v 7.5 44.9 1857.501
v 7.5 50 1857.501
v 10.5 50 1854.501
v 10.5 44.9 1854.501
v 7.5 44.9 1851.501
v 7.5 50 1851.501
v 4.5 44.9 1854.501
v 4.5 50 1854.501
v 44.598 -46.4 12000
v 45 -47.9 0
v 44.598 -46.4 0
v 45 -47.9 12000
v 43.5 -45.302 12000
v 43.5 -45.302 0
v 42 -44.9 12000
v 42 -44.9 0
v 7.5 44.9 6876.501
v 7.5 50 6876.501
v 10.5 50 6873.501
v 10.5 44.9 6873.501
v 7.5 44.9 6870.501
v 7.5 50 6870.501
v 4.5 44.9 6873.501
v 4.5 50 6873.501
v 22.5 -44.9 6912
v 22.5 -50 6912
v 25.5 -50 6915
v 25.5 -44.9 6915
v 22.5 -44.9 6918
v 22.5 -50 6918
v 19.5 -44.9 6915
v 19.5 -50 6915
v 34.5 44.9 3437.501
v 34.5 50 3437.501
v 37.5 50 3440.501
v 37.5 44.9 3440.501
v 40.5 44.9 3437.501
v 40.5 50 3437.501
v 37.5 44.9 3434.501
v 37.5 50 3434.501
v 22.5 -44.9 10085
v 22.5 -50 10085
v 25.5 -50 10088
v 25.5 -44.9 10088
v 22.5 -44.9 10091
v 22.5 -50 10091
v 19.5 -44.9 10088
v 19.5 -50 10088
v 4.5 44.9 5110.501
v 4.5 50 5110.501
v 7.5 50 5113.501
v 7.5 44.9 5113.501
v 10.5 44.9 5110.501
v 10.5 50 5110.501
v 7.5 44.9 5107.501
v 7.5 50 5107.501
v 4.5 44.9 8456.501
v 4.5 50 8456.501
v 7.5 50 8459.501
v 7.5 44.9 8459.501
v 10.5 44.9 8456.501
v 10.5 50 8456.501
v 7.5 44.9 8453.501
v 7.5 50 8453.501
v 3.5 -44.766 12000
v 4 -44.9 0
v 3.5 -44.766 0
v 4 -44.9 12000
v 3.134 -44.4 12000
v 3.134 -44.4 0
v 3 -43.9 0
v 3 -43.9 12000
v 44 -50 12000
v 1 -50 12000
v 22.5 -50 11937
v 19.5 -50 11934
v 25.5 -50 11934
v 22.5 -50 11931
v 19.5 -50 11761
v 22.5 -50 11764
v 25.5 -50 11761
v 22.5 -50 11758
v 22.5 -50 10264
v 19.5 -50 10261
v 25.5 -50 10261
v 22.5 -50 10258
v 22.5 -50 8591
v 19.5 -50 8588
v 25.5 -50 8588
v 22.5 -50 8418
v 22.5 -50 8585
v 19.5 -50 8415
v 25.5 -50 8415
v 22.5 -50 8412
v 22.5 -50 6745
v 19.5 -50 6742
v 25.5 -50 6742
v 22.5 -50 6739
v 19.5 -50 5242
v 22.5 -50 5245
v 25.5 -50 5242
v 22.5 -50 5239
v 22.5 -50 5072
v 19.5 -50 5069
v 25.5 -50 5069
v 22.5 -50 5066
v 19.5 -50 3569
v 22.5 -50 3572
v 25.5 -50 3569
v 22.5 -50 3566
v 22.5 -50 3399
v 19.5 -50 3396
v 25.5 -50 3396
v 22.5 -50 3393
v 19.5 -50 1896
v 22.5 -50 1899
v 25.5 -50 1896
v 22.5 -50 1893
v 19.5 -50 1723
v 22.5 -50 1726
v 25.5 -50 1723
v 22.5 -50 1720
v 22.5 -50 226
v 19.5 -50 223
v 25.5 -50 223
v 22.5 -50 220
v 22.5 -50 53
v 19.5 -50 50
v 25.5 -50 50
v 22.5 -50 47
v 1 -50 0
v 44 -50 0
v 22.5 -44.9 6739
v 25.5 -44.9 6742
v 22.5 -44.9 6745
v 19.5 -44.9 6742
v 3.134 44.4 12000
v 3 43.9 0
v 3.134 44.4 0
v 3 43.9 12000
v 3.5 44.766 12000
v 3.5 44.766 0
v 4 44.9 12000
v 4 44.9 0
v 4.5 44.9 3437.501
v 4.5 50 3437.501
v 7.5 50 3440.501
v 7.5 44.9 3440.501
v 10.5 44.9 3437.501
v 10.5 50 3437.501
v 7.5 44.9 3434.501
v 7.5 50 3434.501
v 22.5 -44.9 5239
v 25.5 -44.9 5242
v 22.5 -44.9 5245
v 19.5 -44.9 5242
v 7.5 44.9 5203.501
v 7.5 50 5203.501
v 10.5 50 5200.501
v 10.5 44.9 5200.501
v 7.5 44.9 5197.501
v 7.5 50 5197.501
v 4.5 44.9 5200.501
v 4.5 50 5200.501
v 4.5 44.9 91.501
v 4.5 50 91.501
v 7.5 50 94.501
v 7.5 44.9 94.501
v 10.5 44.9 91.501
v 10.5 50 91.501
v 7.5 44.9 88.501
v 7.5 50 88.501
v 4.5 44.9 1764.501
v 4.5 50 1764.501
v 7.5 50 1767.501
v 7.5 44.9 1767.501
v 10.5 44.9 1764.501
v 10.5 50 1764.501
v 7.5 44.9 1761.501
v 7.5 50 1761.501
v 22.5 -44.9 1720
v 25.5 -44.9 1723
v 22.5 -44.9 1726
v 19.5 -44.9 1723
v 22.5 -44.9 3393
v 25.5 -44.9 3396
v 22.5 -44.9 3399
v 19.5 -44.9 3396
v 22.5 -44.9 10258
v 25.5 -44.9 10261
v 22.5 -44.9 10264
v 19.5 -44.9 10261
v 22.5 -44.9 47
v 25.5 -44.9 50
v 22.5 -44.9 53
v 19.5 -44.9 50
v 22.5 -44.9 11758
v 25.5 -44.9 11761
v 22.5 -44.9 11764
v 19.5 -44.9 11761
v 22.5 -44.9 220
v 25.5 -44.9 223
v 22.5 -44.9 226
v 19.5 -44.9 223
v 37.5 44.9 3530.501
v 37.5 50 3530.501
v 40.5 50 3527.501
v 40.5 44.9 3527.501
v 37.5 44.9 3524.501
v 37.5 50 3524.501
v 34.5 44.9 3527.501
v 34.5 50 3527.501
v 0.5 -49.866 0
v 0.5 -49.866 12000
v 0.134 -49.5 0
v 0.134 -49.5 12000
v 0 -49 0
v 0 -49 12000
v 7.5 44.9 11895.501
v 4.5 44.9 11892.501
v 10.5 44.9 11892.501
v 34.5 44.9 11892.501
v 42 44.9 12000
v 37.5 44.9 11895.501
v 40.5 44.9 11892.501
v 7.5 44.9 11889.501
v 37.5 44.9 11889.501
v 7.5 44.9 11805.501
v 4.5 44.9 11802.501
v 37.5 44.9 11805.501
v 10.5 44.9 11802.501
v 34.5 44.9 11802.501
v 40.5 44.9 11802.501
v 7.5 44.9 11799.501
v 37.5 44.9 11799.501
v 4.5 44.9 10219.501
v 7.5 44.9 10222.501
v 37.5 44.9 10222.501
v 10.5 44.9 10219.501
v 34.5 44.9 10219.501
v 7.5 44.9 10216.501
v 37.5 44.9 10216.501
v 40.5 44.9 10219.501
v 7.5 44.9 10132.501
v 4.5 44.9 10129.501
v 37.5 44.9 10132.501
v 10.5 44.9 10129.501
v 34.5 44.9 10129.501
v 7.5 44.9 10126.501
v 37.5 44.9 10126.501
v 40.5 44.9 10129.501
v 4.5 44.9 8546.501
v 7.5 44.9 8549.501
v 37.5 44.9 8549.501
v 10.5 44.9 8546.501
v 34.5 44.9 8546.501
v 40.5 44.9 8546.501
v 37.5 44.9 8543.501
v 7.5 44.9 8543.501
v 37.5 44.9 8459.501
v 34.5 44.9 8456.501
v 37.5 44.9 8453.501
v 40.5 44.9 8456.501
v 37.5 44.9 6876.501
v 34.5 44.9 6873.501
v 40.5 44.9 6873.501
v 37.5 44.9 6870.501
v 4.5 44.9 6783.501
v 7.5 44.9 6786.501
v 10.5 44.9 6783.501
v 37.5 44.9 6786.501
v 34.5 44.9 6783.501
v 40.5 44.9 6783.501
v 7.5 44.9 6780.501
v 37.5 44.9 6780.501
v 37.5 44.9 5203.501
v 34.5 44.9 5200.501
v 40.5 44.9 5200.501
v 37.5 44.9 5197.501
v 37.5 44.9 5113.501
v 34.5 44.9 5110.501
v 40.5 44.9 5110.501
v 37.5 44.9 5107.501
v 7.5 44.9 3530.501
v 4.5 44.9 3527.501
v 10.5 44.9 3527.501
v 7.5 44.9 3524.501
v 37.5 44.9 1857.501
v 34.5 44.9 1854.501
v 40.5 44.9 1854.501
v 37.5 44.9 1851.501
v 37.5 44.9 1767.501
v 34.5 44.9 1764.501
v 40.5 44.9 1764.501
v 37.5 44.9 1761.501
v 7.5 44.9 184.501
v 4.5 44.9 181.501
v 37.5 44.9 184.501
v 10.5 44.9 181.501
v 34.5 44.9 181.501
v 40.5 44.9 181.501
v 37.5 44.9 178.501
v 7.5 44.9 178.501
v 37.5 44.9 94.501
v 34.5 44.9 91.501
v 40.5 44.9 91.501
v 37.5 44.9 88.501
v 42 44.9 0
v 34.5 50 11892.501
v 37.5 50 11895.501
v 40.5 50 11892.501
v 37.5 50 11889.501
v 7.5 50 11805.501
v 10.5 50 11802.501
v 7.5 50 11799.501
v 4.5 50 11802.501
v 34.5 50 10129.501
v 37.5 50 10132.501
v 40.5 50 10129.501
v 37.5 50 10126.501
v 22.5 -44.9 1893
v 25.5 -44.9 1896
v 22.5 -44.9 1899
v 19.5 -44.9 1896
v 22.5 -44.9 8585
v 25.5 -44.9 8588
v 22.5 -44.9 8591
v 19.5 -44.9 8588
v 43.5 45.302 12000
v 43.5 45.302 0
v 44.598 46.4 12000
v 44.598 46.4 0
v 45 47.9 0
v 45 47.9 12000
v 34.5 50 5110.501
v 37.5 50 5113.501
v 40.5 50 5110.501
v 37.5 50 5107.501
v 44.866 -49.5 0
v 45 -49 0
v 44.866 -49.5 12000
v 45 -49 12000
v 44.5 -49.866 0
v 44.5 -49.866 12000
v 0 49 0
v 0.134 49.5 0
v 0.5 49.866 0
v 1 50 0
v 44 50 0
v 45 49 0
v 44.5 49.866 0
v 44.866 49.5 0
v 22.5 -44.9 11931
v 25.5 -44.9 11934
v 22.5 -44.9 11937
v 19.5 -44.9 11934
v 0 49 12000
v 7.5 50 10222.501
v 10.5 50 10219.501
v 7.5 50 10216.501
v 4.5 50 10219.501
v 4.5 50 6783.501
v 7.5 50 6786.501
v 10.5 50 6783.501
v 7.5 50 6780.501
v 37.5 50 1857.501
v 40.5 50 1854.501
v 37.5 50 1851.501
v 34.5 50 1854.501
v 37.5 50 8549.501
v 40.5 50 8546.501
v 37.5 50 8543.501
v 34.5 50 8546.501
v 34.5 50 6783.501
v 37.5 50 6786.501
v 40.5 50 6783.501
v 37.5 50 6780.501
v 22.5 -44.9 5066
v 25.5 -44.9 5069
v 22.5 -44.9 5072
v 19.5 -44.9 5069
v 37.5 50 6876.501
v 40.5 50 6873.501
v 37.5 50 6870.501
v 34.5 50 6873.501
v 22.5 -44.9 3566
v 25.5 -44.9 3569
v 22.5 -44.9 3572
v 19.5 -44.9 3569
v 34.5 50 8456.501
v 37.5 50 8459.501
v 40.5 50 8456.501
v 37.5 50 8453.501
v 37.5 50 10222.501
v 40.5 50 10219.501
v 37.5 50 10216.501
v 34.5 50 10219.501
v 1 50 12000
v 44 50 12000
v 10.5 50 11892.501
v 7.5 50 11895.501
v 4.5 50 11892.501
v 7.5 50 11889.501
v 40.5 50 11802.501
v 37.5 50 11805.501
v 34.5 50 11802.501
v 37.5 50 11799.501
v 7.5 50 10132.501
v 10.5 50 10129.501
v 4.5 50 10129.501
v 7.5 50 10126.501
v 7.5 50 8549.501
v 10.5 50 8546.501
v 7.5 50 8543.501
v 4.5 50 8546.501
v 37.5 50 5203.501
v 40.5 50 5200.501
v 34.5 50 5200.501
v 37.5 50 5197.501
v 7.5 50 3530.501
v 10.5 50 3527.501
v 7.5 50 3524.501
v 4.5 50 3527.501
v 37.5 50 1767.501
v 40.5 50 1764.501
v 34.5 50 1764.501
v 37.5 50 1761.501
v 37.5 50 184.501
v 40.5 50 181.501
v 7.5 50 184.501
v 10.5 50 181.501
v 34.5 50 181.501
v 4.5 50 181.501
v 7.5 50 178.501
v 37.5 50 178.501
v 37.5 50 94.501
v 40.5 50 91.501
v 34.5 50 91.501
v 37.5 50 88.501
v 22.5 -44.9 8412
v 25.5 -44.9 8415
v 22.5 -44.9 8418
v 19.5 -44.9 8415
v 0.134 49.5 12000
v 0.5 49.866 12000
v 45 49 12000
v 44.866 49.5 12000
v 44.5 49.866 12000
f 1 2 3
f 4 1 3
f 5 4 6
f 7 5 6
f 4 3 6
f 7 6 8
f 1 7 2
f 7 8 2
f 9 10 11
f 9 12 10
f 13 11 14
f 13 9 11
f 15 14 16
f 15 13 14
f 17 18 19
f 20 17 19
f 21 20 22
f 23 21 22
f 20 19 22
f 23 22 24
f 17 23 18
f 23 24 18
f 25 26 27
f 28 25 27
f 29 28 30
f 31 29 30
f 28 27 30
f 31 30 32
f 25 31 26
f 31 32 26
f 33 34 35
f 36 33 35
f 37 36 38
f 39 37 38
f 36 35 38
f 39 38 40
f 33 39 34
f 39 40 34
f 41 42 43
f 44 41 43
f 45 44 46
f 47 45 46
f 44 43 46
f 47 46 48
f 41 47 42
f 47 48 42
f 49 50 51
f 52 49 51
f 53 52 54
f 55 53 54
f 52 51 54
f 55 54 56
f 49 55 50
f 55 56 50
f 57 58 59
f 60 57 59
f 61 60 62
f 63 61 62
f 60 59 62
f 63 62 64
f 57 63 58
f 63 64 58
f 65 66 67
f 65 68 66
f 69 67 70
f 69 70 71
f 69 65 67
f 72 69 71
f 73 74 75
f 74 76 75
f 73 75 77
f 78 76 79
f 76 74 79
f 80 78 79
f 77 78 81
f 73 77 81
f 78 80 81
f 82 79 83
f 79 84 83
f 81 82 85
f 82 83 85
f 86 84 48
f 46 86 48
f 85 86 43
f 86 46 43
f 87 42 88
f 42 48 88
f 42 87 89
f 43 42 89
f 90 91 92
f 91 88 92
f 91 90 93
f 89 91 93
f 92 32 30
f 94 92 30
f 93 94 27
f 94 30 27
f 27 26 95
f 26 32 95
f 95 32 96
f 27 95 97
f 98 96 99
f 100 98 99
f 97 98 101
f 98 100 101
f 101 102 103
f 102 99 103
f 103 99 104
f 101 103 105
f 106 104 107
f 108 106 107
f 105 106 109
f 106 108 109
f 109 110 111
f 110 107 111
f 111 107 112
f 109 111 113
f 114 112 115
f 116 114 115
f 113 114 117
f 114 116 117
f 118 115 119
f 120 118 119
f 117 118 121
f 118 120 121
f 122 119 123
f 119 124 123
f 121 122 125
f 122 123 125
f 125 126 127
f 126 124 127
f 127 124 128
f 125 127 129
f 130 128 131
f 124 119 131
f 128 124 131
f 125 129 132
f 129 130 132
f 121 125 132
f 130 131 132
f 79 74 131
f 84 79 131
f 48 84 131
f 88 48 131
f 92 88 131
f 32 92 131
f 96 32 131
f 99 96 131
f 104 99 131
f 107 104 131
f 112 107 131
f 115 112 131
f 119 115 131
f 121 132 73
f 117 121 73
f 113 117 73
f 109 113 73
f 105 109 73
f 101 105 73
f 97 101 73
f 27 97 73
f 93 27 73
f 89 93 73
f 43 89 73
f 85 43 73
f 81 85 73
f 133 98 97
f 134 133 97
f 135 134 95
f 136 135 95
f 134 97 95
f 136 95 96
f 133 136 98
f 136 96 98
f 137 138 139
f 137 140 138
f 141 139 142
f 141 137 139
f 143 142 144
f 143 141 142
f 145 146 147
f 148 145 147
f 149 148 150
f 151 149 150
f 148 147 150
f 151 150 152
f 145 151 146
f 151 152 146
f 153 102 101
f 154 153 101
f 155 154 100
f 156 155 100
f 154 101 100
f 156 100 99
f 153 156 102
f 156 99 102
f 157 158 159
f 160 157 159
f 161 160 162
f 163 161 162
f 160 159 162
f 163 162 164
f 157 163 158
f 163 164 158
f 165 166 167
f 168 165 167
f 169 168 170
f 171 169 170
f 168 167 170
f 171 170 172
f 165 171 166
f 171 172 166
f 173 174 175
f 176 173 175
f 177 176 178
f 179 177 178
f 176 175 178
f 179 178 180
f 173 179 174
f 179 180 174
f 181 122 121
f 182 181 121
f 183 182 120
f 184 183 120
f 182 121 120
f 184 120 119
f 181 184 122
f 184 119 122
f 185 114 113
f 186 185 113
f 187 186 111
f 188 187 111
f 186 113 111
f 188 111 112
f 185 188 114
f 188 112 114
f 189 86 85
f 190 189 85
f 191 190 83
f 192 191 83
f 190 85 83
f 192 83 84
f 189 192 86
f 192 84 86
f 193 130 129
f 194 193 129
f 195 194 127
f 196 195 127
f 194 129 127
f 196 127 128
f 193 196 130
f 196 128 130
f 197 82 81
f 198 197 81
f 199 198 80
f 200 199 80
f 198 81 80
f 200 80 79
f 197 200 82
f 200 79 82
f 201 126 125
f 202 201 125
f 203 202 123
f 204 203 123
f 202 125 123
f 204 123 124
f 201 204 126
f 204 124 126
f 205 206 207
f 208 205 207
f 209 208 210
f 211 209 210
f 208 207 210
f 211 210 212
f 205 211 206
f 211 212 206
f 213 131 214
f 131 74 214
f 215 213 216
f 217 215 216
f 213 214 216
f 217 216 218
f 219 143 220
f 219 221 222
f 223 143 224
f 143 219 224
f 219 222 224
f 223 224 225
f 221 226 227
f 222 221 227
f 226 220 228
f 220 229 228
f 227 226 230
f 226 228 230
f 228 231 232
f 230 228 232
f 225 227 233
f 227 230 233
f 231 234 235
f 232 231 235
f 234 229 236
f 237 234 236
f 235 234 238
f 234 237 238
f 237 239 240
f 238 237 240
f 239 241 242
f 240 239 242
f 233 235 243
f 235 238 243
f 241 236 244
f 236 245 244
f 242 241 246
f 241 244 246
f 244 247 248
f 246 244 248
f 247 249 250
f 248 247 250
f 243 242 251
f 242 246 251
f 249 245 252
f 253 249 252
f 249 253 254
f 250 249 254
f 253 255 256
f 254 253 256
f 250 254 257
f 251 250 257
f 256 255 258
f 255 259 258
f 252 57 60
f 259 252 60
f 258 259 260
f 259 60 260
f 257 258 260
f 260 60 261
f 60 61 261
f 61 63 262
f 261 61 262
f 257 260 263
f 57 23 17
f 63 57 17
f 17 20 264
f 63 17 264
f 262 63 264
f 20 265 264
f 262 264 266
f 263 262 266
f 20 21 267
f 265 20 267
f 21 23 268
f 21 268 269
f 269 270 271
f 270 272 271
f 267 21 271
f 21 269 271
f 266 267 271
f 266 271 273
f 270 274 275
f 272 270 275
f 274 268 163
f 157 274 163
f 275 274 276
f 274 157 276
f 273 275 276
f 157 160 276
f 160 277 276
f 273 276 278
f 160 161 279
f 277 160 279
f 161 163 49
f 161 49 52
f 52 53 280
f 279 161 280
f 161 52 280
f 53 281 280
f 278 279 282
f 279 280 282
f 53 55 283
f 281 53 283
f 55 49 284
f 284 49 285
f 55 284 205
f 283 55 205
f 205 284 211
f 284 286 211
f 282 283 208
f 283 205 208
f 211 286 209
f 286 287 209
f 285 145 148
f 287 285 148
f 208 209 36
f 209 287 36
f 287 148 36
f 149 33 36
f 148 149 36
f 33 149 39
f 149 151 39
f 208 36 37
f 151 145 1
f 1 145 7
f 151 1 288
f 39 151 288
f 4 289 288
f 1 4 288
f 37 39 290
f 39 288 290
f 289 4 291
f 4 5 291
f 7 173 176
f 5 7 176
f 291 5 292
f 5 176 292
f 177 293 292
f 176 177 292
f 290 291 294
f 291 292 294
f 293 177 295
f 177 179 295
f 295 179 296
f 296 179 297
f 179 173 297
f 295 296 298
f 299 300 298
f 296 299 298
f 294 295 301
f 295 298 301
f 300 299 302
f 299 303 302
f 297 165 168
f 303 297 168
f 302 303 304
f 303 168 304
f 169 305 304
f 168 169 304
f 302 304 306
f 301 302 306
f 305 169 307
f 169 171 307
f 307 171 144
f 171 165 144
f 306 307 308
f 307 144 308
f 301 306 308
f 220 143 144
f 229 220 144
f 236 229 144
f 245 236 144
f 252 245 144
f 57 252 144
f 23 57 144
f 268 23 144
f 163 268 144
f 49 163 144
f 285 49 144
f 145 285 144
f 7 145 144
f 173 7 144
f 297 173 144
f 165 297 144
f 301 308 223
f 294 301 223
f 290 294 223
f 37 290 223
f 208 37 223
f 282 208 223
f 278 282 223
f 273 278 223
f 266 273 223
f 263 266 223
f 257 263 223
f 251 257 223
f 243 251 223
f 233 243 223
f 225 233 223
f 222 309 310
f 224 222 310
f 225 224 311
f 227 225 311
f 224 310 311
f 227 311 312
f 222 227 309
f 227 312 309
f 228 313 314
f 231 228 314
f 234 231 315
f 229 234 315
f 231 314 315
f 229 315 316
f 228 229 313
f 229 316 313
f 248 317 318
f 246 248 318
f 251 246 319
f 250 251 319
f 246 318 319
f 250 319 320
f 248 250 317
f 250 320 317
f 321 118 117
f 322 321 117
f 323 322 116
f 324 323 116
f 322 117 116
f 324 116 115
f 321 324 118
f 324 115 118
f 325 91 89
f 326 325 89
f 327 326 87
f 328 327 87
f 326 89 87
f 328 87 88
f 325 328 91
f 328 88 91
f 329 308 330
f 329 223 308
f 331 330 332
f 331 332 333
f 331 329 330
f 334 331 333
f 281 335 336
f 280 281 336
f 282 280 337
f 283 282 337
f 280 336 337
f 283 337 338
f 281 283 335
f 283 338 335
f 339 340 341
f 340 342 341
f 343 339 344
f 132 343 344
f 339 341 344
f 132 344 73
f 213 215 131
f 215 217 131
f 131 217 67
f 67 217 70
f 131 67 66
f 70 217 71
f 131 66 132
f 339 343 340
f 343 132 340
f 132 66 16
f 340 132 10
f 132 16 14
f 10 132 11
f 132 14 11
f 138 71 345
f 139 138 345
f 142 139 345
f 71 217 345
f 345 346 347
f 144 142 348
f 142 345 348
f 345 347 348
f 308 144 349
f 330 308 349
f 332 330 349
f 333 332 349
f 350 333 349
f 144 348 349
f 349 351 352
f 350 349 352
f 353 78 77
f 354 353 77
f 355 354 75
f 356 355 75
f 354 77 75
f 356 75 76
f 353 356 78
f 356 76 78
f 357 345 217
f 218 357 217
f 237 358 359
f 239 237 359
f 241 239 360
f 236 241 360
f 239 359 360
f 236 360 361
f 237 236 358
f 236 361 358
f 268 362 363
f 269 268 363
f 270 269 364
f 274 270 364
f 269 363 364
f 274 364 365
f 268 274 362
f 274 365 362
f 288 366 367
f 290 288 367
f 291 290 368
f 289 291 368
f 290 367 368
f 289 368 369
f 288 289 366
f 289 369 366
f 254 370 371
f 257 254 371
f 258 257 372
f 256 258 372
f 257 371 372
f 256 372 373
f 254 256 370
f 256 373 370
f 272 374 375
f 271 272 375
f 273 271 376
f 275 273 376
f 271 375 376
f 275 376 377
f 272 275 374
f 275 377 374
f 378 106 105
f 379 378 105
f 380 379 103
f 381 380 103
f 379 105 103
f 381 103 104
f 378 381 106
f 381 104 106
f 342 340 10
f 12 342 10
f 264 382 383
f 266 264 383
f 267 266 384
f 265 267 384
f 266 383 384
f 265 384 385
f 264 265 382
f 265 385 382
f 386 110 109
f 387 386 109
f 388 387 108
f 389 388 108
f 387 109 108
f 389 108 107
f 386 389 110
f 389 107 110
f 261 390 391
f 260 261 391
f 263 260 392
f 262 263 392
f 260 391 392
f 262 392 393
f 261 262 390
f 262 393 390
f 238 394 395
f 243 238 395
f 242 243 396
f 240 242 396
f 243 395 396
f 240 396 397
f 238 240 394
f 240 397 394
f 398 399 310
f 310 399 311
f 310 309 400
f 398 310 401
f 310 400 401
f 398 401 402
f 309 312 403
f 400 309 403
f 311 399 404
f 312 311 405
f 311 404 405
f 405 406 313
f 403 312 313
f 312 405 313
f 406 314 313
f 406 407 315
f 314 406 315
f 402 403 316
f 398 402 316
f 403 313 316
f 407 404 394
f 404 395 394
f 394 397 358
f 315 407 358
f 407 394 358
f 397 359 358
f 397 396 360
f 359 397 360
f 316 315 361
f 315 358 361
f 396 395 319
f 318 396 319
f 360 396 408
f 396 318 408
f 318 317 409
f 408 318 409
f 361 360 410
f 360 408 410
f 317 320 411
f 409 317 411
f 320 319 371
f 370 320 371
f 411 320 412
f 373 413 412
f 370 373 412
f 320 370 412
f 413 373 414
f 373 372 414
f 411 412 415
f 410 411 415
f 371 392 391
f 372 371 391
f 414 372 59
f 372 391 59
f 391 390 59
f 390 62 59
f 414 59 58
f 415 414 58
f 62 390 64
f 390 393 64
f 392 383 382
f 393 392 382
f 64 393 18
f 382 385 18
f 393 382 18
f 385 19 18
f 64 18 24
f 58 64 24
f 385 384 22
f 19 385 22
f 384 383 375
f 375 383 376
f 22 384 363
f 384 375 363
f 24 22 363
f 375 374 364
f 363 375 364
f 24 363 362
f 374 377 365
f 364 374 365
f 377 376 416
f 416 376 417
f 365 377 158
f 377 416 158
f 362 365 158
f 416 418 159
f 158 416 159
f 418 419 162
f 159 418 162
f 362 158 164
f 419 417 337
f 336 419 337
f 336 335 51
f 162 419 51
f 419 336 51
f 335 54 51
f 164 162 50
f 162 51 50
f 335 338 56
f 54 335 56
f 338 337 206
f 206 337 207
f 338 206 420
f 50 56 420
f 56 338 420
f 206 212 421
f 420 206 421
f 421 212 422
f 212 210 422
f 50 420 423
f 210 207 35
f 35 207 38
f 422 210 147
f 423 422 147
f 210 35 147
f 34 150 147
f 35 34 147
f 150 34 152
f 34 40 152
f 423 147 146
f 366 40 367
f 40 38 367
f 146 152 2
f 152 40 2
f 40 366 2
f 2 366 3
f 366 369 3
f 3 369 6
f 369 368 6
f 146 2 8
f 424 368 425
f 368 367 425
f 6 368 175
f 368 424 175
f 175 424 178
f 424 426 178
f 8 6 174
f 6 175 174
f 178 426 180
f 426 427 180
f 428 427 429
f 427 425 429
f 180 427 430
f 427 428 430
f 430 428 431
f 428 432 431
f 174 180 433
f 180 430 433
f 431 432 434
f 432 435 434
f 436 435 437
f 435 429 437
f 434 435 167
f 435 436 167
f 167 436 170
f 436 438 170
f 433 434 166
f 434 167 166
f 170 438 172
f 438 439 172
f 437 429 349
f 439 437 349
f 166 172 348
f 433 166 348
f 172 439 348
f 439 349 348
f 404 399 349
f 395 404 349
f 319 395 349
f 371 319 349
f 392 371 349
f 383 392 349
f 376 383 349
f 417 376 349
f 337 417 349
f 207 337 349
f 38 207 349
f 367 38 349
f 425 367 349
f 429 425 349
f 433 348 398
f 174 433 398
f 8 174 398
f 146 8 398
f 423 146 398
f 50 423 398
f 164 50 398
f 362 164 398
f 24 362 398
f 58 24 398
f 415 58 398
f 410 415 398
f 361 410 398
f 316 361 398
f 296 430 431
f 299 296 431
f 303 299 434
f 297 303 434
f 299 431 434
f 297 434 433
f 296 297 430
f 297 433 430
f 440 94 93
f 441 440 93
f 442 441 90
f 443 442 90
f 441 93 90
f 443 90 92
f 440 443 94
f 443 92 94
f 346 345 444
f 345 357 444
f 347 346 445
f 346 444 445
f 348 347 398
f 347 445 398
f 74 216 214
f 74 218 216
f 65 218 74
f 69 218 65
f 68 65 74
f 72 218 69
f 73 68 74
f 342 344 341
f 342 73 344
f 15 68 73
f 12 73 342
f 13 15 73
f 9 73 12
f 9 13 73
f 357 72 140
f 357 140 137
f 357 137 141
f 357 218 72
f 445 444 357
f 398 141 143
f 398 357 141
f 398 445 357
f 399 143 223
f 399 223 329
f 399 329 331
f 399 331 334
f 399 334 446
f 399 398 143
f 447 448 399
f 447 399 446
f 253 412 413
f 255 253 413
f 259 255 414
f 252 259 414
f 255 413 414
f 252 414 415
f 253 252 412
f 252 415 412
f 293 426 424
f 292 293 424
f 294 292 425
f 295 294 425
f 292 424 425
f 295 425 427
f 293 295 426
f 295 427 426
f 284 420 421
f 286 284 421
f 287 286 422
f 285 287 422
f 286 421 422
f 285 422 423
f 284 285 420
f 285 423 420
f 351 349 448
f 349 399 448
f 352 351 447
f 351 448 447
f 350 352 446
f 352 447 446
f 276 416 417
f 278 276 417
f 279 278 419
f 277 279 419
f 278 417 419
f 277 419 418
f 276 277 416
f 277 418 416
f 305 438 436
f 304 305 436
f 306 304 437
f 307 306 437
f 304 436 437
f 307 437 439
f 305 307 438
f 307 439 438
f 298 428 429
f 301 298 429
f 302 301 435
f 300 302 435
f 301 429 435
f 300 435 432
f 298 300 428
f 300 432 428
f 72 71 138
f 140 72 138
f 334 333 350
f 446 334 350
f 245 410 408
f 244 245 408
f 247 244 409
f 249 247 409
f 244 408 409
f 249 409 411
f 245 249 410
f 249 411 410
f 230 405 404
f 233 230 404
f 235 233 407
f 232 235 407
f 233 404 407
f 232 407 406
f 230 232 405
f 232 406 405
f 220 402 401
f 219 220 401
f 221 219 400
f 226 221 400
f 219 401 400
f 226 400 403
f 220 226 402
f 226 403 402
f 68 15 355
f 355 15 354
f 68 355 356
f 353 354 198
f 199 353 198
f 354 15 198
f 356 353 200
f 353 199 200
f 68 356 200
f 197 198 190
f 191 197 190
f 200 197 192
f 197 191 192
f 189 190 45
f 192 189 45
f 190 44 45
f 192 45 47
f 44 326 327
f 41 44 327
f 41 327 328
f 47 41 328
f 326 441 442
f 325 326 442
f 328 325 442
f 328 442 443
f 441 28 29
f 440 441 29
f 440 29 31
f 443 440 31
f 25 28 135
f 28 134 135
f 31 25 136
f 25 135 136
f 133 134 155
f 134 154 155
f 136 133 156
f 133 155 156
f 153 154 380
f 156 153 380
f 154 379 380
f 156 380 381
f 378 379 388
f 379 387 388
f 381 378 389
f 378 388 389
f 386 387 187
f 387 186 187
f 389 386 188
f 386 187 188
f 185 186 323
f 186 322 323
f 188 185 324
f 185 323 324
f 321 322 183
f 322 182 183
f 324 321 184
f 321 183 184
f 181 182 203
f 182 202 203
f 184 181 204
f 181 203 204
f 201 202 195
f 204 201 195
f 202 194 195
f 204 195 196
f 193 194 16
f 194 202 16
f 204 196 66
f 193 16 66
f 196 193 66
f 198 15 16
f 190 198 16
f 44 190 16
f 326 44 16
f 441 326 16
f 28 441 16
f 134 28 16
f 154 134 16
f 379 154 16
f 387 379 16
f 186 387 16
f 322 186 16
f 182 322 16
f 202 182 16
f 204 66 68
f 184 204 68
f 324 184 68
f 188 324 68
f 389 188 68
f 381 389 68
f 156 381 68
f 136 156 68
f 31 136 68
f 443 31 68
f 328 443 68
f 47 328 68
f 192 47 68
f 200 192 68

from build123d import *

# Parameters (mm, degrees)
BOSS_EXTRUDE1_DEPTH = 12000
FILLET1_R           = 3
FILLET2_R           = 1
FILLET3_R           = 1
CUT_EXTRUDE4_REACH  = 12002.501
SKETCH4_R           = 3
SKETCH5_R           = 3
CUT_EXTRUDE5_DEPTH  = 10


with BuildPart() as part:
    # Sketch1 → Boss-Extrude1 (new body)
    with BuildSketch(Plane.XY):
        Polygon((0, 50), (0, -50), (45, -50), (45, -44.9), (3, -44.9), (3, 44.9), (45, 44.9), (45, 50), align=None)
    extrude(amount=BOSS_EXTRUDE1_DEPTH)

    # Fillet1
    fillet1_edges = [part.edges().sort_by_distance(p)[0] for p in [
        (45, -44.9, 6000),
        (45, 44.9, 6000),
    ]]
    fillet(fillet1_edges, radius=FILLET1_R)

    # Fillet2
    fillet2_edges = [part.edges().sort_by_distance(p)[0] for p in [
        (45, -50, 6000),
        (0, -50, 6000),
        (0, 50, 6000),
        (45, 50, 6000),
    ]]
    fillet(fillet2_edges, radius=FILLET2_R)

    # Fillet3
    fillet3_edges = [part.edges().sort_by_distance(p)[0] for p in [
        (3, -44.9, 6000),
        (3, 44.9, 6000),
    ]]
    fillet(fillet3_edges, radius=FILLET3_R)

    # Sketch4 → Cut-Extrude4 (cut, up to next)
    with BuildSketch(Plane.XZ.offset(50), mode=Mode.PRIVATE) as cut_extrude4_sk1:
        with Locations(Location((22.5, 50, 0), (0, 0, 270))):
            Circle(SKETCH4_R)
    cut_extrude4_tool1 = extrude(cut_extrude4_sk1.sketch, amount=-CUT_EXTRUDE4_REACH, mode=Mode.PRIVATE) & part.part
    # Sketch4 → Cut-Extrude4 (cut, up to next)
    with BuildSketch(Plane.XZ.offset(50), mode=Mode.PRIVATE) as cut_extrude4_sk2:
        with Locations(Location((22.5, 223, 0), (0, 0, 270))):
            Circle(SKETCH4_R)
    cut_extrude4_tool2 = extrude(cut_extrude4_sk2.sketch, amount=-CUT_EXTRUDE4_REACH, mode=Mode.PRIVATE) & part.part
    # Sketch4 → Cut-Extrude4 (cut, up to next)
    with BuildSketch(Plane.XZ.offset(50), mode=Mode.PRIVATE) as cut_extrude4_sk3:
        with Locations(Location((22.5, 1723, 0), (0, 0, 270))):
            Circle(SKETCH4_R)
    cut_extrude4_tool3 = extrude(cut_extrude4_sk3.sketch, amount=-CUT_EXTRUDE4_REACH, mode=Mode.PRIVATE) & part.part
    # Sketch4 → Cut-Extrude4 (cut, up to next)
    with BuildSketch(Plane.XZ.offset(50), mode=Mode.PRIVATE) as cut_extrude4_sk4:
        with Locations(Location((22.5, 1896, 0), (0, 0, 270))):
            Circle(SKETCH4_R)
    cut_extrude4_tool4 = extrude(cut_extrude4_sk4.sketch, amount=-CUT_EXTRUDE4_REACH, mode=Mode.PRIVATE) & part.part
    # Sketch4 → Cut-Extrude4 (cut, up to next)
    with BuildSketch(Plane.XZ.offset(50), mode=Mode.PRIVATE) as cut_extrude4_sk5:
        with Locations(Location((22.5, 3396, 0), (0, 0, 270))):
            Circle(SKETCH4_R)
    cut_extrude4_tool5 = extrude(cut_extrude4_sk5.sketch, amount=-CUT_EXTRUDE4_REACH, mode=Mode.PRIVATE) & part.part
    # Sketch4 → Cut-Extrude4 (cut, up to next)
    with BuildSketch(Plane.XZ.offset(50), mode=Mode.PRIVATE) as cut_extrude4_sk6:
        with Locations(Location((22.5, 3569, 0), (0, 0, 270))):
            Circle(SKETCH4_R)
    cut_extrude4_tool6 = extrude(cut_extrude4_sk6.sketch, amount=-CUT_EXTRUDE4_REACH, mode=Mode.PRIVATE) & part.part
    # Sketch4 → Cut-Extrude4 (cut, up to next)
    with BuildSketch(Plane.XZ.offset(50), mode=Mode.PRIVATE) as cut_extrude4_sk7:
        with Locations(Location((22.5, 5069, 0), (0, 0, 270))):
            Circle(SKETCH4_R)
    cut_extrude4_tool7 = extrude(cut_extrude4_sk7.sketch, amount=-CUT_EXTRUDE4_REACH, mode=Mode.PRIVATE) & part.part
    # Sketch4 → Cut-Extrude4 (cut, up to next)
    with BuildSketch(Plane.XZ.offset(50), mode=Mode.PRIVATE) as cut_extrude4_sk8:
        with Locations(Location((22.5, 5242, 0), (0, 0, 270))):
            Circle(SKETCH4_R)
    cut_extrude4_tool8 = extrude(cut_extrude4_sk8.sketch, amount=-CUT_EXTRUDE4_REACH, mode=Mode.PRIVATE) & part.part
    # Sketch4 → Cut-Extrude4 (cut, up to next)
    with BuildSketch(Plane.XZ.offset(50), mode=Mode.PRIVATE) as cut_extrude4_sk9:
        with Locations(Location((22.5, 6742, 0), (0, 0, 270))):
            Circle(SKETCH4_R)
    cut_extrude4_tool9 = extrude(cut_extrude4_sk9.sketch, amount=-CUT_EXTRUDE4_REACH, mode=Mode.PRIVATE) & part.part
    # Sketch4 → Cut-Extrude4 (cut, up to next)
    with BuildSketch(Plane.XZ.offset(50), mode=Mode.PRIVATE) as cut_extrude4_sk10:
        with Locations(Location((22.5, 6915, 0), (0, 0, 270))):
            Circle(SKETCH4_R)
    cut_extrude4_tool10 = extrude(cut_extrude4_sk10.sketch, amount=-CUT_EXTRUDE4_REACH, mode=Mode.PRIVATE) & part.part
    # Sketch4 → Cut-Extrude4 (cut, up to next)
    with BuildSketch(Plane.XZ.offset(50), mode=Mode.PRIVATE) as cut_extrude4_sk11:
        with Locations(Location((22.5, 8415, 0), (0, 0, 270))):
            Circle(SKETCH4_R)
    cut_extrude4_tool11 = extrude(cut_extrude4_sk11.sketch, amount=-CUT_EXTRUDE4_REACH, mode=Mode.PRIVATE) & part.part
    # Sketch4 → Cut-Extrude4 (cut, up to next)
    with BuildSketch(Plane.XZ.offset(50), mode=Mode.PRIVATE) as cut_extrude4_sk12:
        with Locations(Location((22.5, 8588, 0), (0, 0, 270))):
            Circle(SKETCH4_R)
    cut_extrude4_tool12 = extrude(cut_extrude4_sk12.sketch, amount=-CUT_EXTRUDE4_REACH, mode=Mode.PRIVATE) & part.part
    # Sketch4 → Cut-Extrude4 (cut, up to next)
    with BuildSketch(Plane.XZ.offset(50), mode=Mode.PRIVATE) as cut_extrude4_sk13:
        with Locations(Location((22.5, 10088, 0), (0, 0, 270))):
            Circle(SKETCH4_R)
    cut_extrude4_tool13 = extrude(cut_extrude4_sk13.sketch, amount=-CUT_EXTRUDE4_REACH, mode=Mode.PRIVATE) & part.part
    # Sketch4 → Cut-Extrude4 (cut, up to next)
    with BuildSketch(Plane.XZ.offset(50), mode=Mode.PRIVATE) as cut_extrude4_sk14:
        with Locations(Location((22.5, 10261, 0), (0, 0, 270))):
            Circle(SKETCH4_R)
    cut_extrude4_tool14 = extrude(cut_extrude4_sk14.sketch, amount=-CUT_EXTRUDE4_REACH, mode=Mode.PRIVATE) & part.part
    # Sketch4 → Cut-Extrude4 (cut, up to next)
    with BuildSketch(Plane.XZ.offset(50), mode=Mode.PRIVATE) as cut_extrude4_sk15:
        with Locations(Location((22.5, 11761, 0), (0, 0, 270))):
            Circle(SKETCH4_R)
    cut_extrude4_tool15 = extrude(cut_extrude4_sk15.sketch, amount=-CUT_EXTRUDE4_REACH, mode=Mode.PRIVATE) & part.part
    # Sketch4 → Cut-Extrude4 (cut, up to next)
    with BuildSketch(Plane.XZ.offset(50), mode=Mode.PRIVATE) as cut_extrude4_sk16:
        with Locations(Location((22.5, 11934, 0), (0, 0, 270))):
            Circle(SKETCH4_R)
    cut_extrude4_tool16 = extrude(cut_extrude4_sk16.sketch, amount=-CUT_EXTRUDE4_REACH, mode=Mode.PRIVATE) & part.part
    add(cut_extrude4_tool1.solids().sort_by_distance((22.5, -50, 50))[0], mode=Mode.SUBTRACT)
    add(cut_extrude4_tool2.solids().sort_by_distance((22.5, -50, 223))[0], mode=Mode.SUBTRACT)
    add(cut_extrude4_tool3.solids().sort_by_distance((22.5, -50, 1723))[0], mode=Mode.SUBTRACT)
    add(cut_extrude4_tool4.solids().sort_by_distance((22.5, -50, 1896))[0], mode=Mode.SUBTRACT)
    add(cut_extrude4_tool5.solids().sort_by_distance((22.5, -50, 3396))[0], mode=Mode.SUBTRACT)
    add(cut_extrude4_tool6.solids().sort_by_distance((22.5, -50, 3569))[0], mode=Mode.SUBTRACT)
    add(cut_extrude4_tool7.solids().sort_by_distance((22.5, -50, 5069))[0], mode=Mode.SUBTRACT)
    add(cut_extrude4_tool8.solids().sort_by_distance((22.5, -50, 5242))[0], mode=Mode.SUBTRACT)
    add(cut_extrude4_tool9.solids().sort_by_distance((22.5, -50, 6742))[0], mode=Mode.SUBTRACT)
    add(cut_extrude4_tool10.solids().sort_by_distance((22.5, -50, 6915))[0], mode=Mode.SUBTRACT)
    add(cut_extrude4_tool11.solids().sort_by_distance((22.5, -50, 8415))[0], mode=Mode.SUBTRACT)
    add(cut_extrude4_tool12.solids().sort_by_distance((22.5, -50, 8588))[0], mode=Mode.SUBTRACT)
    add(cut_extrude4_tool13.solids().sort_by_distance((22.5, -50, 10088))[0], mode=Mode.SUBTRACT)
    add(cut_extrude4_tool14.solids().sort_by_distance((22.5, -50, 10261))[0], mode=Mode.SUBTRACT)
    add(cut_extrude4_tool15.solids().sort_by_distance((22.5, -50, 11761))[0], mode=Mode.SUBTRACT)
    add(cut_extrude4_tool16.solids().sort_by_distance((22.5, -50, 11934))[0], mode=Mode.SUBTRACT)

    # Sketch5 → Cut-Extrude5 (cut)
    with BuildSketch(Plane(origin=(0, 50, 0), x_dir=(1, 0, 0), z_dir=(0, 1, 0))):
        with Locations(Location((37.5, -181.501212025, 0), (0, 0, 270))):
            Circle(SKETCH5_R)
        with Locations(Location((7.5, -181.501212025, 0), (0, 0, 270))):
            Circle(SKETCH5_R)
        with Locations(Location((7.5, -91.501212025, 0), (0, 0, 180))):
            Circle(SKETCH5_R)
        with Locations(Location((37.5, -91.501212025, 0), (0, 0, 180))):
            Circle(SKETCH5_R)
        with Locations(Location((37.5, -1854.501212025, 0), (0, 0, 270))):
            Circle(SKETCH5_R)
        with Locations(Location((7.5, -1854.501212025, 0), (0, 0, 270))):
            Circle(SKETCH5_R)
        with Locations(Location((7.5, -1764.501212025, 0), (0, 0, 180))):
            Circle(SKETCH5_R)
        with Locations(Location((37.5, -1764.501212025, 0), (0, 0, 180))):
            Circle(SKETCH5_R)
        with Locations(Location((37.5, -3527.501212025, 0), (0, 0, 270))):
            Circle(SKETCH5_R)
        with Locations(Location((7.5, -3527.501212025, 0), (0, 0, 270))):
            Circle(SKETCH5_R)
        with Locations(Location((7.5, -3437.501212025, 0), (0, 0, 180))):
            Circle(SKETCH5_R)
        with Locations(Location((37.5, -3437.501212025, 0), (0, 0, 180))):
            Circle(SKETCH5_R)
        with Locations(Location((37.5, -5200.501212025, 0), (0, 0, 270))):
            Circle(SKETCH5_R)
        with Locations(Location((7.5, -5200.501212025, 0), (0, 0, 270))):
            Circle(SKETCH5_R)
        with Locations(Location((7.5, -5110.501212025, 0), (0, 0, 180))):
            Circle(SKETCH5_R)
        with Locations(Location((37.5, -5110.501212025, 0), (0, 0, 180))):
            Circle(SKETCH5_R)
        with Locations(Location((37.5, -6873.501212025, 0), (0, 0, 270))):
            Circle(SKETCH5_R)
        with Locations(Location((7.5, -6873.501212025, 0), (0, 0, 270))):
            Circle(SKETCH5_R)
        with Locations(Location((7.5, -6783.501212025, 0), (0, 0, 180))):
            Circle(SKETCH5_R)
        with Locations(Location((37.5, -6783.501212025, 0), (0, 0, 180))):
            Circle(SKETCH5_R)
        with Locations(Location((37.5, -8546.501212025, 0), (0, 0, 270))):
            Circle(SKETCH5_R)
        with Locations(Location((7.5, -8546.501212025, 0), (0, 0, 270))):
            Circle(SKETCH5_R)
        with Locations(Location((7.5, -8456.501212025, 0), (0, 0, 180))):
            Circle(SKETCH5_R)
        with Locations(Location((37.5, -8456.501212025, 0), (0, 0, 180))):
            Circle(SKETCH5_R)
        with Locations(Location((37.5, -10219.501212025, 0), (0, 0, 270))):
            Circle(SKETCH5_R)
        with Locations(Location((7.5, -10219.501212025, 0), (0, 0, 270))):
            Circle(SKETCH5_R)
        with Locations(Location((7.5, -10129.501212025, 0), (0, 0, 180))):
            Circle(SKETCH5_R)
        with Locations(Location((37.5, -10129.501212025, 0), (0, 0, 180))):
            Circle(SKETCH5_R)
        with Locations(Location((7.5, -11802.501212025, 0), (0, 0, 270))):
            Circle(SKETCH5_R)
        with Locations(Location((37.5, -11802.501212025, 0), (0, 0, 270))):
            Circle(SKETCH5_R)
        with Locations(Location((37.5, -11892.501212025, 0), (0, 0, 180))):
            Circle(SKETCH5_R)
        with Locations(Location((7.5, -11892.501212025, 0), (0, 0, 180))):
            Circle(SKETCH5_R)
    extrude(amount=-CUT_EXTRUDE5_DEPTH, mode=Mode.SUBTRACT)


solid = part.part
